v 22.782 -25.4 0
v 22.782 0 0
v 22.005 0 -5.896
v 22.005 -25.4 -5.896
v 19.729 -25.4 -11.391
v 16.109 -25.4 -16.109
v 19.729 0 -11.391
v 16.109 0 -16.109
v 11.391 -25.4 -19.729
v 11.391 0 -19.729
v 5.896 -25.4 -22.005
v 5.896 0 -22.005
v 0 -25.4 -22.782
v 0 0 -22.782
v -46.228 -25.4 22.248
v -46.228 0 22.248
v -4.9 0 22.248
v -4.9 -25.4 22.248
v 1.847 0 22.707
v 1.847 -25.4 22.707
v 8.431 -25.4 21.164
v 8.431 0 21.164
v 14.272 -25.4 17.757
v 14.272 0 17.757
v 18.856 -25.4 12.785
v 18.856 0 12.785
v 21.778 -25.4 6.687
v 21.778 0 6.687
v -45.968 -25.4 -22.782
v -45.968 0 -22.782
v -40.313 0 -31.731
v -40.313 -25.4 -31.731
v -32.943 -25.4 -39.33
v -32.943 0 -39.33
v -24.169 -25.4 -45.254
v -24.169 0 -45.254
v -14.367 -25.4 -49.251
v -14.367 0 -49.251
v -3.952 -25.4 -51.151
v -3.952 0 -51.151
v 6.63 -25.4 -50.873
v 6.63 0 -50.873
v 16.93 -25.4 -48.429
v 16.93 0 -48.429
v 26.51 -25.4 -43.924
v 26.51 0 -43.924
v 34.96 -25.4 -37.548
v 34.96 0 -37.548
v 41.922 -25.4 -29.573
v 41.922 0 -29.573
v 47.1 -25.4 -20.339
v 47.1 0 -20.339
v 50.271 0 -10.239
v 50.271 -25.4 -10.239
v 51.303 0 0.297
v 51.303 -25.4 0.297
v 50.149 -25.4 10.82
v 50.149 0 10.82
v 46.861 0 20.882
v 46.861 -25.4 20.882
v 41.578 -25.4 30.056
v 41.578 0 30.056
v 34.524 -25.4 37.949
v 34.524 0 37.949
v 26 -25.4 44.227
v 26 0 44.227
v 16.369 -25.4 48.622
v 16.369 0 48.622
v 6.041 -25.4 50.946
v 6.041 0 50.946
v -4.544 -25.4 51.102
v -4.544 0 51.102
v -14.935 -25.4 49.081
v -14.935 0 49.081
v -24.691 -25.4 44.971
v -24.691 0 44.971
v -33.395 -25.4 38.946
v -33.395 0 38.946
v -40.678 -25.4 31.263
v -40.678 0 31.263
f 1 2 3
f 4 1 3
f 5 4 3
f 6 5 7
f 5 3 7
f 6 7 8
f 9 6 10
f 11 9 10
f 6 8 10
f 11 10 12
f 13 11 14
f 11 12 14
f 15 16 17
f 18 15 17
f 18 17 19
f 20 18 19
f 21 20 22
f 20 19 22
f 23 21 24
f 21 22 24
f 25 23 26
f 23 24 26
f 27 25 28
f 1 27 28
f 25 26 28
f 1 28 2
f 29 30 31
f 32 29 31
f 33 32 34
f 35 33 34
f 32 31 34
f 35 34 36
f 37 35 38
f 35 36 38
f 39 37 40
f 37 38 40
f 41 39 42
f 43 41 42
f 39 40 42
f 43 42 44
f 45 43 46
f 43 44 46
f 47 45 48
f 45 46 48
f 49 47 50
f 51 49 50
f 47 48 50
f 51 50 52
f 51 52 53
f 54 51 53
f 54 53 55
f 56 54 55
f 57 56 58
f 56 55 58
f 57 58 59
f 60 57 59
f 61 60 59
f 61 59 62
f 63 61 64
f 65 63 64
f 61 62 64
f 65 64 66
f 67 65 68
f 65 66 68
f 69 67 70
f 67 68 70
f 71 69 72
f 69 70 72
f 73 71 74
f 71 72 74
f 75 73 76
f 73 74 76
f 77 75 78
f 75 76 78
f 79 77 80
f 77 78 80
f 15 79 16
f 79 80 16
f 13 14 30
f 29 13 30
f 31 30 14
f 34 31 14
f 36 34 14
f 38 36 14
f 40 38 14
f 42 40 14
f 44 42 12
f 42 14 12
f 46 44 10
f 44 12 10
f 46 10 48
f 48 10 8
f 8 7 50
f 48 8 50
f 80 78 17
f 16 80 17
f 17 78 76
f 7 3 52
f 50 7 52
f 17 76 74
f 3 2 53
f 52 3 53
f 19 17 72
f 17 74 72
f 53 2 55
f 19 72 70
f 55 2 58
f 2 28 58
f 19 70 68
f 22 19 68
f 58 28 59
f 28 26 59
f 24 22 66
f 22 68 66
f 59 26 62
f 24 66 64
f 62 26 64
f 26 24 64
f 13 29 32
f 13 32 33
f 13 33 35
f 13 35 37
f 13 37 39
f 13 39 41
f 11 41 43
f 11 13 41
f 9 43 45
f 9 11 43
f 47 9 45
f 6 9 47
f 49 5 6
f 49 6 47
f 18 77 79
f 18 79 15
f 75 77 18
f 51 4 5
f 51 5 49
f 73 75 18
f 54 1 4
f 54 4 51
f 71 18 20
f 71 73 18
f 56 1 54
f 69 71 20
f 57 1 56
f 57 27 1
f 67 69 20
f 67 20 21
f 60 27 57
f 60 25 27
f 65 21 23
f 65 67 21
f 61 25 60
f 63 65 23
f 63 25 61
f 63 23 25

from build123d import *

# Parameters (mm, degrees)
F1_DEPTH = 25.4


with BuildPart() as f1:
    # F0 (on Front) → F1 (new body)
    with BuildSketch(Plane.XZ):
        with BuildLine():
            ThreePointArc((-45.9678303927, -22.7815092248), (11.6989896867, -49.9516990089), (51.3033974856, 0))
            ThreePointArc((51.3033974856, 0), (11.4099635295, 50.0185098321), (-46.2282065968, 22.2484046263))
            Line((-46.2282065968, 22.2484046263), (-4.8995565251, 22.2484046263))
            ThreePointArc((-4.8995565251, 22.2484046263), (14.2719632564, 17.7569205485), (22.7815092248, 0))
            ThreePointArc((22.7815092248, 0), (16.1089596585, -16.1089596585), (0, -22.7815092248))
            Line((0, -22.7815092248), (-45.9678303927, -22.7815092248))
        make_face()
    extrude(amount=F1_DEPTH)


solid = f1.part
